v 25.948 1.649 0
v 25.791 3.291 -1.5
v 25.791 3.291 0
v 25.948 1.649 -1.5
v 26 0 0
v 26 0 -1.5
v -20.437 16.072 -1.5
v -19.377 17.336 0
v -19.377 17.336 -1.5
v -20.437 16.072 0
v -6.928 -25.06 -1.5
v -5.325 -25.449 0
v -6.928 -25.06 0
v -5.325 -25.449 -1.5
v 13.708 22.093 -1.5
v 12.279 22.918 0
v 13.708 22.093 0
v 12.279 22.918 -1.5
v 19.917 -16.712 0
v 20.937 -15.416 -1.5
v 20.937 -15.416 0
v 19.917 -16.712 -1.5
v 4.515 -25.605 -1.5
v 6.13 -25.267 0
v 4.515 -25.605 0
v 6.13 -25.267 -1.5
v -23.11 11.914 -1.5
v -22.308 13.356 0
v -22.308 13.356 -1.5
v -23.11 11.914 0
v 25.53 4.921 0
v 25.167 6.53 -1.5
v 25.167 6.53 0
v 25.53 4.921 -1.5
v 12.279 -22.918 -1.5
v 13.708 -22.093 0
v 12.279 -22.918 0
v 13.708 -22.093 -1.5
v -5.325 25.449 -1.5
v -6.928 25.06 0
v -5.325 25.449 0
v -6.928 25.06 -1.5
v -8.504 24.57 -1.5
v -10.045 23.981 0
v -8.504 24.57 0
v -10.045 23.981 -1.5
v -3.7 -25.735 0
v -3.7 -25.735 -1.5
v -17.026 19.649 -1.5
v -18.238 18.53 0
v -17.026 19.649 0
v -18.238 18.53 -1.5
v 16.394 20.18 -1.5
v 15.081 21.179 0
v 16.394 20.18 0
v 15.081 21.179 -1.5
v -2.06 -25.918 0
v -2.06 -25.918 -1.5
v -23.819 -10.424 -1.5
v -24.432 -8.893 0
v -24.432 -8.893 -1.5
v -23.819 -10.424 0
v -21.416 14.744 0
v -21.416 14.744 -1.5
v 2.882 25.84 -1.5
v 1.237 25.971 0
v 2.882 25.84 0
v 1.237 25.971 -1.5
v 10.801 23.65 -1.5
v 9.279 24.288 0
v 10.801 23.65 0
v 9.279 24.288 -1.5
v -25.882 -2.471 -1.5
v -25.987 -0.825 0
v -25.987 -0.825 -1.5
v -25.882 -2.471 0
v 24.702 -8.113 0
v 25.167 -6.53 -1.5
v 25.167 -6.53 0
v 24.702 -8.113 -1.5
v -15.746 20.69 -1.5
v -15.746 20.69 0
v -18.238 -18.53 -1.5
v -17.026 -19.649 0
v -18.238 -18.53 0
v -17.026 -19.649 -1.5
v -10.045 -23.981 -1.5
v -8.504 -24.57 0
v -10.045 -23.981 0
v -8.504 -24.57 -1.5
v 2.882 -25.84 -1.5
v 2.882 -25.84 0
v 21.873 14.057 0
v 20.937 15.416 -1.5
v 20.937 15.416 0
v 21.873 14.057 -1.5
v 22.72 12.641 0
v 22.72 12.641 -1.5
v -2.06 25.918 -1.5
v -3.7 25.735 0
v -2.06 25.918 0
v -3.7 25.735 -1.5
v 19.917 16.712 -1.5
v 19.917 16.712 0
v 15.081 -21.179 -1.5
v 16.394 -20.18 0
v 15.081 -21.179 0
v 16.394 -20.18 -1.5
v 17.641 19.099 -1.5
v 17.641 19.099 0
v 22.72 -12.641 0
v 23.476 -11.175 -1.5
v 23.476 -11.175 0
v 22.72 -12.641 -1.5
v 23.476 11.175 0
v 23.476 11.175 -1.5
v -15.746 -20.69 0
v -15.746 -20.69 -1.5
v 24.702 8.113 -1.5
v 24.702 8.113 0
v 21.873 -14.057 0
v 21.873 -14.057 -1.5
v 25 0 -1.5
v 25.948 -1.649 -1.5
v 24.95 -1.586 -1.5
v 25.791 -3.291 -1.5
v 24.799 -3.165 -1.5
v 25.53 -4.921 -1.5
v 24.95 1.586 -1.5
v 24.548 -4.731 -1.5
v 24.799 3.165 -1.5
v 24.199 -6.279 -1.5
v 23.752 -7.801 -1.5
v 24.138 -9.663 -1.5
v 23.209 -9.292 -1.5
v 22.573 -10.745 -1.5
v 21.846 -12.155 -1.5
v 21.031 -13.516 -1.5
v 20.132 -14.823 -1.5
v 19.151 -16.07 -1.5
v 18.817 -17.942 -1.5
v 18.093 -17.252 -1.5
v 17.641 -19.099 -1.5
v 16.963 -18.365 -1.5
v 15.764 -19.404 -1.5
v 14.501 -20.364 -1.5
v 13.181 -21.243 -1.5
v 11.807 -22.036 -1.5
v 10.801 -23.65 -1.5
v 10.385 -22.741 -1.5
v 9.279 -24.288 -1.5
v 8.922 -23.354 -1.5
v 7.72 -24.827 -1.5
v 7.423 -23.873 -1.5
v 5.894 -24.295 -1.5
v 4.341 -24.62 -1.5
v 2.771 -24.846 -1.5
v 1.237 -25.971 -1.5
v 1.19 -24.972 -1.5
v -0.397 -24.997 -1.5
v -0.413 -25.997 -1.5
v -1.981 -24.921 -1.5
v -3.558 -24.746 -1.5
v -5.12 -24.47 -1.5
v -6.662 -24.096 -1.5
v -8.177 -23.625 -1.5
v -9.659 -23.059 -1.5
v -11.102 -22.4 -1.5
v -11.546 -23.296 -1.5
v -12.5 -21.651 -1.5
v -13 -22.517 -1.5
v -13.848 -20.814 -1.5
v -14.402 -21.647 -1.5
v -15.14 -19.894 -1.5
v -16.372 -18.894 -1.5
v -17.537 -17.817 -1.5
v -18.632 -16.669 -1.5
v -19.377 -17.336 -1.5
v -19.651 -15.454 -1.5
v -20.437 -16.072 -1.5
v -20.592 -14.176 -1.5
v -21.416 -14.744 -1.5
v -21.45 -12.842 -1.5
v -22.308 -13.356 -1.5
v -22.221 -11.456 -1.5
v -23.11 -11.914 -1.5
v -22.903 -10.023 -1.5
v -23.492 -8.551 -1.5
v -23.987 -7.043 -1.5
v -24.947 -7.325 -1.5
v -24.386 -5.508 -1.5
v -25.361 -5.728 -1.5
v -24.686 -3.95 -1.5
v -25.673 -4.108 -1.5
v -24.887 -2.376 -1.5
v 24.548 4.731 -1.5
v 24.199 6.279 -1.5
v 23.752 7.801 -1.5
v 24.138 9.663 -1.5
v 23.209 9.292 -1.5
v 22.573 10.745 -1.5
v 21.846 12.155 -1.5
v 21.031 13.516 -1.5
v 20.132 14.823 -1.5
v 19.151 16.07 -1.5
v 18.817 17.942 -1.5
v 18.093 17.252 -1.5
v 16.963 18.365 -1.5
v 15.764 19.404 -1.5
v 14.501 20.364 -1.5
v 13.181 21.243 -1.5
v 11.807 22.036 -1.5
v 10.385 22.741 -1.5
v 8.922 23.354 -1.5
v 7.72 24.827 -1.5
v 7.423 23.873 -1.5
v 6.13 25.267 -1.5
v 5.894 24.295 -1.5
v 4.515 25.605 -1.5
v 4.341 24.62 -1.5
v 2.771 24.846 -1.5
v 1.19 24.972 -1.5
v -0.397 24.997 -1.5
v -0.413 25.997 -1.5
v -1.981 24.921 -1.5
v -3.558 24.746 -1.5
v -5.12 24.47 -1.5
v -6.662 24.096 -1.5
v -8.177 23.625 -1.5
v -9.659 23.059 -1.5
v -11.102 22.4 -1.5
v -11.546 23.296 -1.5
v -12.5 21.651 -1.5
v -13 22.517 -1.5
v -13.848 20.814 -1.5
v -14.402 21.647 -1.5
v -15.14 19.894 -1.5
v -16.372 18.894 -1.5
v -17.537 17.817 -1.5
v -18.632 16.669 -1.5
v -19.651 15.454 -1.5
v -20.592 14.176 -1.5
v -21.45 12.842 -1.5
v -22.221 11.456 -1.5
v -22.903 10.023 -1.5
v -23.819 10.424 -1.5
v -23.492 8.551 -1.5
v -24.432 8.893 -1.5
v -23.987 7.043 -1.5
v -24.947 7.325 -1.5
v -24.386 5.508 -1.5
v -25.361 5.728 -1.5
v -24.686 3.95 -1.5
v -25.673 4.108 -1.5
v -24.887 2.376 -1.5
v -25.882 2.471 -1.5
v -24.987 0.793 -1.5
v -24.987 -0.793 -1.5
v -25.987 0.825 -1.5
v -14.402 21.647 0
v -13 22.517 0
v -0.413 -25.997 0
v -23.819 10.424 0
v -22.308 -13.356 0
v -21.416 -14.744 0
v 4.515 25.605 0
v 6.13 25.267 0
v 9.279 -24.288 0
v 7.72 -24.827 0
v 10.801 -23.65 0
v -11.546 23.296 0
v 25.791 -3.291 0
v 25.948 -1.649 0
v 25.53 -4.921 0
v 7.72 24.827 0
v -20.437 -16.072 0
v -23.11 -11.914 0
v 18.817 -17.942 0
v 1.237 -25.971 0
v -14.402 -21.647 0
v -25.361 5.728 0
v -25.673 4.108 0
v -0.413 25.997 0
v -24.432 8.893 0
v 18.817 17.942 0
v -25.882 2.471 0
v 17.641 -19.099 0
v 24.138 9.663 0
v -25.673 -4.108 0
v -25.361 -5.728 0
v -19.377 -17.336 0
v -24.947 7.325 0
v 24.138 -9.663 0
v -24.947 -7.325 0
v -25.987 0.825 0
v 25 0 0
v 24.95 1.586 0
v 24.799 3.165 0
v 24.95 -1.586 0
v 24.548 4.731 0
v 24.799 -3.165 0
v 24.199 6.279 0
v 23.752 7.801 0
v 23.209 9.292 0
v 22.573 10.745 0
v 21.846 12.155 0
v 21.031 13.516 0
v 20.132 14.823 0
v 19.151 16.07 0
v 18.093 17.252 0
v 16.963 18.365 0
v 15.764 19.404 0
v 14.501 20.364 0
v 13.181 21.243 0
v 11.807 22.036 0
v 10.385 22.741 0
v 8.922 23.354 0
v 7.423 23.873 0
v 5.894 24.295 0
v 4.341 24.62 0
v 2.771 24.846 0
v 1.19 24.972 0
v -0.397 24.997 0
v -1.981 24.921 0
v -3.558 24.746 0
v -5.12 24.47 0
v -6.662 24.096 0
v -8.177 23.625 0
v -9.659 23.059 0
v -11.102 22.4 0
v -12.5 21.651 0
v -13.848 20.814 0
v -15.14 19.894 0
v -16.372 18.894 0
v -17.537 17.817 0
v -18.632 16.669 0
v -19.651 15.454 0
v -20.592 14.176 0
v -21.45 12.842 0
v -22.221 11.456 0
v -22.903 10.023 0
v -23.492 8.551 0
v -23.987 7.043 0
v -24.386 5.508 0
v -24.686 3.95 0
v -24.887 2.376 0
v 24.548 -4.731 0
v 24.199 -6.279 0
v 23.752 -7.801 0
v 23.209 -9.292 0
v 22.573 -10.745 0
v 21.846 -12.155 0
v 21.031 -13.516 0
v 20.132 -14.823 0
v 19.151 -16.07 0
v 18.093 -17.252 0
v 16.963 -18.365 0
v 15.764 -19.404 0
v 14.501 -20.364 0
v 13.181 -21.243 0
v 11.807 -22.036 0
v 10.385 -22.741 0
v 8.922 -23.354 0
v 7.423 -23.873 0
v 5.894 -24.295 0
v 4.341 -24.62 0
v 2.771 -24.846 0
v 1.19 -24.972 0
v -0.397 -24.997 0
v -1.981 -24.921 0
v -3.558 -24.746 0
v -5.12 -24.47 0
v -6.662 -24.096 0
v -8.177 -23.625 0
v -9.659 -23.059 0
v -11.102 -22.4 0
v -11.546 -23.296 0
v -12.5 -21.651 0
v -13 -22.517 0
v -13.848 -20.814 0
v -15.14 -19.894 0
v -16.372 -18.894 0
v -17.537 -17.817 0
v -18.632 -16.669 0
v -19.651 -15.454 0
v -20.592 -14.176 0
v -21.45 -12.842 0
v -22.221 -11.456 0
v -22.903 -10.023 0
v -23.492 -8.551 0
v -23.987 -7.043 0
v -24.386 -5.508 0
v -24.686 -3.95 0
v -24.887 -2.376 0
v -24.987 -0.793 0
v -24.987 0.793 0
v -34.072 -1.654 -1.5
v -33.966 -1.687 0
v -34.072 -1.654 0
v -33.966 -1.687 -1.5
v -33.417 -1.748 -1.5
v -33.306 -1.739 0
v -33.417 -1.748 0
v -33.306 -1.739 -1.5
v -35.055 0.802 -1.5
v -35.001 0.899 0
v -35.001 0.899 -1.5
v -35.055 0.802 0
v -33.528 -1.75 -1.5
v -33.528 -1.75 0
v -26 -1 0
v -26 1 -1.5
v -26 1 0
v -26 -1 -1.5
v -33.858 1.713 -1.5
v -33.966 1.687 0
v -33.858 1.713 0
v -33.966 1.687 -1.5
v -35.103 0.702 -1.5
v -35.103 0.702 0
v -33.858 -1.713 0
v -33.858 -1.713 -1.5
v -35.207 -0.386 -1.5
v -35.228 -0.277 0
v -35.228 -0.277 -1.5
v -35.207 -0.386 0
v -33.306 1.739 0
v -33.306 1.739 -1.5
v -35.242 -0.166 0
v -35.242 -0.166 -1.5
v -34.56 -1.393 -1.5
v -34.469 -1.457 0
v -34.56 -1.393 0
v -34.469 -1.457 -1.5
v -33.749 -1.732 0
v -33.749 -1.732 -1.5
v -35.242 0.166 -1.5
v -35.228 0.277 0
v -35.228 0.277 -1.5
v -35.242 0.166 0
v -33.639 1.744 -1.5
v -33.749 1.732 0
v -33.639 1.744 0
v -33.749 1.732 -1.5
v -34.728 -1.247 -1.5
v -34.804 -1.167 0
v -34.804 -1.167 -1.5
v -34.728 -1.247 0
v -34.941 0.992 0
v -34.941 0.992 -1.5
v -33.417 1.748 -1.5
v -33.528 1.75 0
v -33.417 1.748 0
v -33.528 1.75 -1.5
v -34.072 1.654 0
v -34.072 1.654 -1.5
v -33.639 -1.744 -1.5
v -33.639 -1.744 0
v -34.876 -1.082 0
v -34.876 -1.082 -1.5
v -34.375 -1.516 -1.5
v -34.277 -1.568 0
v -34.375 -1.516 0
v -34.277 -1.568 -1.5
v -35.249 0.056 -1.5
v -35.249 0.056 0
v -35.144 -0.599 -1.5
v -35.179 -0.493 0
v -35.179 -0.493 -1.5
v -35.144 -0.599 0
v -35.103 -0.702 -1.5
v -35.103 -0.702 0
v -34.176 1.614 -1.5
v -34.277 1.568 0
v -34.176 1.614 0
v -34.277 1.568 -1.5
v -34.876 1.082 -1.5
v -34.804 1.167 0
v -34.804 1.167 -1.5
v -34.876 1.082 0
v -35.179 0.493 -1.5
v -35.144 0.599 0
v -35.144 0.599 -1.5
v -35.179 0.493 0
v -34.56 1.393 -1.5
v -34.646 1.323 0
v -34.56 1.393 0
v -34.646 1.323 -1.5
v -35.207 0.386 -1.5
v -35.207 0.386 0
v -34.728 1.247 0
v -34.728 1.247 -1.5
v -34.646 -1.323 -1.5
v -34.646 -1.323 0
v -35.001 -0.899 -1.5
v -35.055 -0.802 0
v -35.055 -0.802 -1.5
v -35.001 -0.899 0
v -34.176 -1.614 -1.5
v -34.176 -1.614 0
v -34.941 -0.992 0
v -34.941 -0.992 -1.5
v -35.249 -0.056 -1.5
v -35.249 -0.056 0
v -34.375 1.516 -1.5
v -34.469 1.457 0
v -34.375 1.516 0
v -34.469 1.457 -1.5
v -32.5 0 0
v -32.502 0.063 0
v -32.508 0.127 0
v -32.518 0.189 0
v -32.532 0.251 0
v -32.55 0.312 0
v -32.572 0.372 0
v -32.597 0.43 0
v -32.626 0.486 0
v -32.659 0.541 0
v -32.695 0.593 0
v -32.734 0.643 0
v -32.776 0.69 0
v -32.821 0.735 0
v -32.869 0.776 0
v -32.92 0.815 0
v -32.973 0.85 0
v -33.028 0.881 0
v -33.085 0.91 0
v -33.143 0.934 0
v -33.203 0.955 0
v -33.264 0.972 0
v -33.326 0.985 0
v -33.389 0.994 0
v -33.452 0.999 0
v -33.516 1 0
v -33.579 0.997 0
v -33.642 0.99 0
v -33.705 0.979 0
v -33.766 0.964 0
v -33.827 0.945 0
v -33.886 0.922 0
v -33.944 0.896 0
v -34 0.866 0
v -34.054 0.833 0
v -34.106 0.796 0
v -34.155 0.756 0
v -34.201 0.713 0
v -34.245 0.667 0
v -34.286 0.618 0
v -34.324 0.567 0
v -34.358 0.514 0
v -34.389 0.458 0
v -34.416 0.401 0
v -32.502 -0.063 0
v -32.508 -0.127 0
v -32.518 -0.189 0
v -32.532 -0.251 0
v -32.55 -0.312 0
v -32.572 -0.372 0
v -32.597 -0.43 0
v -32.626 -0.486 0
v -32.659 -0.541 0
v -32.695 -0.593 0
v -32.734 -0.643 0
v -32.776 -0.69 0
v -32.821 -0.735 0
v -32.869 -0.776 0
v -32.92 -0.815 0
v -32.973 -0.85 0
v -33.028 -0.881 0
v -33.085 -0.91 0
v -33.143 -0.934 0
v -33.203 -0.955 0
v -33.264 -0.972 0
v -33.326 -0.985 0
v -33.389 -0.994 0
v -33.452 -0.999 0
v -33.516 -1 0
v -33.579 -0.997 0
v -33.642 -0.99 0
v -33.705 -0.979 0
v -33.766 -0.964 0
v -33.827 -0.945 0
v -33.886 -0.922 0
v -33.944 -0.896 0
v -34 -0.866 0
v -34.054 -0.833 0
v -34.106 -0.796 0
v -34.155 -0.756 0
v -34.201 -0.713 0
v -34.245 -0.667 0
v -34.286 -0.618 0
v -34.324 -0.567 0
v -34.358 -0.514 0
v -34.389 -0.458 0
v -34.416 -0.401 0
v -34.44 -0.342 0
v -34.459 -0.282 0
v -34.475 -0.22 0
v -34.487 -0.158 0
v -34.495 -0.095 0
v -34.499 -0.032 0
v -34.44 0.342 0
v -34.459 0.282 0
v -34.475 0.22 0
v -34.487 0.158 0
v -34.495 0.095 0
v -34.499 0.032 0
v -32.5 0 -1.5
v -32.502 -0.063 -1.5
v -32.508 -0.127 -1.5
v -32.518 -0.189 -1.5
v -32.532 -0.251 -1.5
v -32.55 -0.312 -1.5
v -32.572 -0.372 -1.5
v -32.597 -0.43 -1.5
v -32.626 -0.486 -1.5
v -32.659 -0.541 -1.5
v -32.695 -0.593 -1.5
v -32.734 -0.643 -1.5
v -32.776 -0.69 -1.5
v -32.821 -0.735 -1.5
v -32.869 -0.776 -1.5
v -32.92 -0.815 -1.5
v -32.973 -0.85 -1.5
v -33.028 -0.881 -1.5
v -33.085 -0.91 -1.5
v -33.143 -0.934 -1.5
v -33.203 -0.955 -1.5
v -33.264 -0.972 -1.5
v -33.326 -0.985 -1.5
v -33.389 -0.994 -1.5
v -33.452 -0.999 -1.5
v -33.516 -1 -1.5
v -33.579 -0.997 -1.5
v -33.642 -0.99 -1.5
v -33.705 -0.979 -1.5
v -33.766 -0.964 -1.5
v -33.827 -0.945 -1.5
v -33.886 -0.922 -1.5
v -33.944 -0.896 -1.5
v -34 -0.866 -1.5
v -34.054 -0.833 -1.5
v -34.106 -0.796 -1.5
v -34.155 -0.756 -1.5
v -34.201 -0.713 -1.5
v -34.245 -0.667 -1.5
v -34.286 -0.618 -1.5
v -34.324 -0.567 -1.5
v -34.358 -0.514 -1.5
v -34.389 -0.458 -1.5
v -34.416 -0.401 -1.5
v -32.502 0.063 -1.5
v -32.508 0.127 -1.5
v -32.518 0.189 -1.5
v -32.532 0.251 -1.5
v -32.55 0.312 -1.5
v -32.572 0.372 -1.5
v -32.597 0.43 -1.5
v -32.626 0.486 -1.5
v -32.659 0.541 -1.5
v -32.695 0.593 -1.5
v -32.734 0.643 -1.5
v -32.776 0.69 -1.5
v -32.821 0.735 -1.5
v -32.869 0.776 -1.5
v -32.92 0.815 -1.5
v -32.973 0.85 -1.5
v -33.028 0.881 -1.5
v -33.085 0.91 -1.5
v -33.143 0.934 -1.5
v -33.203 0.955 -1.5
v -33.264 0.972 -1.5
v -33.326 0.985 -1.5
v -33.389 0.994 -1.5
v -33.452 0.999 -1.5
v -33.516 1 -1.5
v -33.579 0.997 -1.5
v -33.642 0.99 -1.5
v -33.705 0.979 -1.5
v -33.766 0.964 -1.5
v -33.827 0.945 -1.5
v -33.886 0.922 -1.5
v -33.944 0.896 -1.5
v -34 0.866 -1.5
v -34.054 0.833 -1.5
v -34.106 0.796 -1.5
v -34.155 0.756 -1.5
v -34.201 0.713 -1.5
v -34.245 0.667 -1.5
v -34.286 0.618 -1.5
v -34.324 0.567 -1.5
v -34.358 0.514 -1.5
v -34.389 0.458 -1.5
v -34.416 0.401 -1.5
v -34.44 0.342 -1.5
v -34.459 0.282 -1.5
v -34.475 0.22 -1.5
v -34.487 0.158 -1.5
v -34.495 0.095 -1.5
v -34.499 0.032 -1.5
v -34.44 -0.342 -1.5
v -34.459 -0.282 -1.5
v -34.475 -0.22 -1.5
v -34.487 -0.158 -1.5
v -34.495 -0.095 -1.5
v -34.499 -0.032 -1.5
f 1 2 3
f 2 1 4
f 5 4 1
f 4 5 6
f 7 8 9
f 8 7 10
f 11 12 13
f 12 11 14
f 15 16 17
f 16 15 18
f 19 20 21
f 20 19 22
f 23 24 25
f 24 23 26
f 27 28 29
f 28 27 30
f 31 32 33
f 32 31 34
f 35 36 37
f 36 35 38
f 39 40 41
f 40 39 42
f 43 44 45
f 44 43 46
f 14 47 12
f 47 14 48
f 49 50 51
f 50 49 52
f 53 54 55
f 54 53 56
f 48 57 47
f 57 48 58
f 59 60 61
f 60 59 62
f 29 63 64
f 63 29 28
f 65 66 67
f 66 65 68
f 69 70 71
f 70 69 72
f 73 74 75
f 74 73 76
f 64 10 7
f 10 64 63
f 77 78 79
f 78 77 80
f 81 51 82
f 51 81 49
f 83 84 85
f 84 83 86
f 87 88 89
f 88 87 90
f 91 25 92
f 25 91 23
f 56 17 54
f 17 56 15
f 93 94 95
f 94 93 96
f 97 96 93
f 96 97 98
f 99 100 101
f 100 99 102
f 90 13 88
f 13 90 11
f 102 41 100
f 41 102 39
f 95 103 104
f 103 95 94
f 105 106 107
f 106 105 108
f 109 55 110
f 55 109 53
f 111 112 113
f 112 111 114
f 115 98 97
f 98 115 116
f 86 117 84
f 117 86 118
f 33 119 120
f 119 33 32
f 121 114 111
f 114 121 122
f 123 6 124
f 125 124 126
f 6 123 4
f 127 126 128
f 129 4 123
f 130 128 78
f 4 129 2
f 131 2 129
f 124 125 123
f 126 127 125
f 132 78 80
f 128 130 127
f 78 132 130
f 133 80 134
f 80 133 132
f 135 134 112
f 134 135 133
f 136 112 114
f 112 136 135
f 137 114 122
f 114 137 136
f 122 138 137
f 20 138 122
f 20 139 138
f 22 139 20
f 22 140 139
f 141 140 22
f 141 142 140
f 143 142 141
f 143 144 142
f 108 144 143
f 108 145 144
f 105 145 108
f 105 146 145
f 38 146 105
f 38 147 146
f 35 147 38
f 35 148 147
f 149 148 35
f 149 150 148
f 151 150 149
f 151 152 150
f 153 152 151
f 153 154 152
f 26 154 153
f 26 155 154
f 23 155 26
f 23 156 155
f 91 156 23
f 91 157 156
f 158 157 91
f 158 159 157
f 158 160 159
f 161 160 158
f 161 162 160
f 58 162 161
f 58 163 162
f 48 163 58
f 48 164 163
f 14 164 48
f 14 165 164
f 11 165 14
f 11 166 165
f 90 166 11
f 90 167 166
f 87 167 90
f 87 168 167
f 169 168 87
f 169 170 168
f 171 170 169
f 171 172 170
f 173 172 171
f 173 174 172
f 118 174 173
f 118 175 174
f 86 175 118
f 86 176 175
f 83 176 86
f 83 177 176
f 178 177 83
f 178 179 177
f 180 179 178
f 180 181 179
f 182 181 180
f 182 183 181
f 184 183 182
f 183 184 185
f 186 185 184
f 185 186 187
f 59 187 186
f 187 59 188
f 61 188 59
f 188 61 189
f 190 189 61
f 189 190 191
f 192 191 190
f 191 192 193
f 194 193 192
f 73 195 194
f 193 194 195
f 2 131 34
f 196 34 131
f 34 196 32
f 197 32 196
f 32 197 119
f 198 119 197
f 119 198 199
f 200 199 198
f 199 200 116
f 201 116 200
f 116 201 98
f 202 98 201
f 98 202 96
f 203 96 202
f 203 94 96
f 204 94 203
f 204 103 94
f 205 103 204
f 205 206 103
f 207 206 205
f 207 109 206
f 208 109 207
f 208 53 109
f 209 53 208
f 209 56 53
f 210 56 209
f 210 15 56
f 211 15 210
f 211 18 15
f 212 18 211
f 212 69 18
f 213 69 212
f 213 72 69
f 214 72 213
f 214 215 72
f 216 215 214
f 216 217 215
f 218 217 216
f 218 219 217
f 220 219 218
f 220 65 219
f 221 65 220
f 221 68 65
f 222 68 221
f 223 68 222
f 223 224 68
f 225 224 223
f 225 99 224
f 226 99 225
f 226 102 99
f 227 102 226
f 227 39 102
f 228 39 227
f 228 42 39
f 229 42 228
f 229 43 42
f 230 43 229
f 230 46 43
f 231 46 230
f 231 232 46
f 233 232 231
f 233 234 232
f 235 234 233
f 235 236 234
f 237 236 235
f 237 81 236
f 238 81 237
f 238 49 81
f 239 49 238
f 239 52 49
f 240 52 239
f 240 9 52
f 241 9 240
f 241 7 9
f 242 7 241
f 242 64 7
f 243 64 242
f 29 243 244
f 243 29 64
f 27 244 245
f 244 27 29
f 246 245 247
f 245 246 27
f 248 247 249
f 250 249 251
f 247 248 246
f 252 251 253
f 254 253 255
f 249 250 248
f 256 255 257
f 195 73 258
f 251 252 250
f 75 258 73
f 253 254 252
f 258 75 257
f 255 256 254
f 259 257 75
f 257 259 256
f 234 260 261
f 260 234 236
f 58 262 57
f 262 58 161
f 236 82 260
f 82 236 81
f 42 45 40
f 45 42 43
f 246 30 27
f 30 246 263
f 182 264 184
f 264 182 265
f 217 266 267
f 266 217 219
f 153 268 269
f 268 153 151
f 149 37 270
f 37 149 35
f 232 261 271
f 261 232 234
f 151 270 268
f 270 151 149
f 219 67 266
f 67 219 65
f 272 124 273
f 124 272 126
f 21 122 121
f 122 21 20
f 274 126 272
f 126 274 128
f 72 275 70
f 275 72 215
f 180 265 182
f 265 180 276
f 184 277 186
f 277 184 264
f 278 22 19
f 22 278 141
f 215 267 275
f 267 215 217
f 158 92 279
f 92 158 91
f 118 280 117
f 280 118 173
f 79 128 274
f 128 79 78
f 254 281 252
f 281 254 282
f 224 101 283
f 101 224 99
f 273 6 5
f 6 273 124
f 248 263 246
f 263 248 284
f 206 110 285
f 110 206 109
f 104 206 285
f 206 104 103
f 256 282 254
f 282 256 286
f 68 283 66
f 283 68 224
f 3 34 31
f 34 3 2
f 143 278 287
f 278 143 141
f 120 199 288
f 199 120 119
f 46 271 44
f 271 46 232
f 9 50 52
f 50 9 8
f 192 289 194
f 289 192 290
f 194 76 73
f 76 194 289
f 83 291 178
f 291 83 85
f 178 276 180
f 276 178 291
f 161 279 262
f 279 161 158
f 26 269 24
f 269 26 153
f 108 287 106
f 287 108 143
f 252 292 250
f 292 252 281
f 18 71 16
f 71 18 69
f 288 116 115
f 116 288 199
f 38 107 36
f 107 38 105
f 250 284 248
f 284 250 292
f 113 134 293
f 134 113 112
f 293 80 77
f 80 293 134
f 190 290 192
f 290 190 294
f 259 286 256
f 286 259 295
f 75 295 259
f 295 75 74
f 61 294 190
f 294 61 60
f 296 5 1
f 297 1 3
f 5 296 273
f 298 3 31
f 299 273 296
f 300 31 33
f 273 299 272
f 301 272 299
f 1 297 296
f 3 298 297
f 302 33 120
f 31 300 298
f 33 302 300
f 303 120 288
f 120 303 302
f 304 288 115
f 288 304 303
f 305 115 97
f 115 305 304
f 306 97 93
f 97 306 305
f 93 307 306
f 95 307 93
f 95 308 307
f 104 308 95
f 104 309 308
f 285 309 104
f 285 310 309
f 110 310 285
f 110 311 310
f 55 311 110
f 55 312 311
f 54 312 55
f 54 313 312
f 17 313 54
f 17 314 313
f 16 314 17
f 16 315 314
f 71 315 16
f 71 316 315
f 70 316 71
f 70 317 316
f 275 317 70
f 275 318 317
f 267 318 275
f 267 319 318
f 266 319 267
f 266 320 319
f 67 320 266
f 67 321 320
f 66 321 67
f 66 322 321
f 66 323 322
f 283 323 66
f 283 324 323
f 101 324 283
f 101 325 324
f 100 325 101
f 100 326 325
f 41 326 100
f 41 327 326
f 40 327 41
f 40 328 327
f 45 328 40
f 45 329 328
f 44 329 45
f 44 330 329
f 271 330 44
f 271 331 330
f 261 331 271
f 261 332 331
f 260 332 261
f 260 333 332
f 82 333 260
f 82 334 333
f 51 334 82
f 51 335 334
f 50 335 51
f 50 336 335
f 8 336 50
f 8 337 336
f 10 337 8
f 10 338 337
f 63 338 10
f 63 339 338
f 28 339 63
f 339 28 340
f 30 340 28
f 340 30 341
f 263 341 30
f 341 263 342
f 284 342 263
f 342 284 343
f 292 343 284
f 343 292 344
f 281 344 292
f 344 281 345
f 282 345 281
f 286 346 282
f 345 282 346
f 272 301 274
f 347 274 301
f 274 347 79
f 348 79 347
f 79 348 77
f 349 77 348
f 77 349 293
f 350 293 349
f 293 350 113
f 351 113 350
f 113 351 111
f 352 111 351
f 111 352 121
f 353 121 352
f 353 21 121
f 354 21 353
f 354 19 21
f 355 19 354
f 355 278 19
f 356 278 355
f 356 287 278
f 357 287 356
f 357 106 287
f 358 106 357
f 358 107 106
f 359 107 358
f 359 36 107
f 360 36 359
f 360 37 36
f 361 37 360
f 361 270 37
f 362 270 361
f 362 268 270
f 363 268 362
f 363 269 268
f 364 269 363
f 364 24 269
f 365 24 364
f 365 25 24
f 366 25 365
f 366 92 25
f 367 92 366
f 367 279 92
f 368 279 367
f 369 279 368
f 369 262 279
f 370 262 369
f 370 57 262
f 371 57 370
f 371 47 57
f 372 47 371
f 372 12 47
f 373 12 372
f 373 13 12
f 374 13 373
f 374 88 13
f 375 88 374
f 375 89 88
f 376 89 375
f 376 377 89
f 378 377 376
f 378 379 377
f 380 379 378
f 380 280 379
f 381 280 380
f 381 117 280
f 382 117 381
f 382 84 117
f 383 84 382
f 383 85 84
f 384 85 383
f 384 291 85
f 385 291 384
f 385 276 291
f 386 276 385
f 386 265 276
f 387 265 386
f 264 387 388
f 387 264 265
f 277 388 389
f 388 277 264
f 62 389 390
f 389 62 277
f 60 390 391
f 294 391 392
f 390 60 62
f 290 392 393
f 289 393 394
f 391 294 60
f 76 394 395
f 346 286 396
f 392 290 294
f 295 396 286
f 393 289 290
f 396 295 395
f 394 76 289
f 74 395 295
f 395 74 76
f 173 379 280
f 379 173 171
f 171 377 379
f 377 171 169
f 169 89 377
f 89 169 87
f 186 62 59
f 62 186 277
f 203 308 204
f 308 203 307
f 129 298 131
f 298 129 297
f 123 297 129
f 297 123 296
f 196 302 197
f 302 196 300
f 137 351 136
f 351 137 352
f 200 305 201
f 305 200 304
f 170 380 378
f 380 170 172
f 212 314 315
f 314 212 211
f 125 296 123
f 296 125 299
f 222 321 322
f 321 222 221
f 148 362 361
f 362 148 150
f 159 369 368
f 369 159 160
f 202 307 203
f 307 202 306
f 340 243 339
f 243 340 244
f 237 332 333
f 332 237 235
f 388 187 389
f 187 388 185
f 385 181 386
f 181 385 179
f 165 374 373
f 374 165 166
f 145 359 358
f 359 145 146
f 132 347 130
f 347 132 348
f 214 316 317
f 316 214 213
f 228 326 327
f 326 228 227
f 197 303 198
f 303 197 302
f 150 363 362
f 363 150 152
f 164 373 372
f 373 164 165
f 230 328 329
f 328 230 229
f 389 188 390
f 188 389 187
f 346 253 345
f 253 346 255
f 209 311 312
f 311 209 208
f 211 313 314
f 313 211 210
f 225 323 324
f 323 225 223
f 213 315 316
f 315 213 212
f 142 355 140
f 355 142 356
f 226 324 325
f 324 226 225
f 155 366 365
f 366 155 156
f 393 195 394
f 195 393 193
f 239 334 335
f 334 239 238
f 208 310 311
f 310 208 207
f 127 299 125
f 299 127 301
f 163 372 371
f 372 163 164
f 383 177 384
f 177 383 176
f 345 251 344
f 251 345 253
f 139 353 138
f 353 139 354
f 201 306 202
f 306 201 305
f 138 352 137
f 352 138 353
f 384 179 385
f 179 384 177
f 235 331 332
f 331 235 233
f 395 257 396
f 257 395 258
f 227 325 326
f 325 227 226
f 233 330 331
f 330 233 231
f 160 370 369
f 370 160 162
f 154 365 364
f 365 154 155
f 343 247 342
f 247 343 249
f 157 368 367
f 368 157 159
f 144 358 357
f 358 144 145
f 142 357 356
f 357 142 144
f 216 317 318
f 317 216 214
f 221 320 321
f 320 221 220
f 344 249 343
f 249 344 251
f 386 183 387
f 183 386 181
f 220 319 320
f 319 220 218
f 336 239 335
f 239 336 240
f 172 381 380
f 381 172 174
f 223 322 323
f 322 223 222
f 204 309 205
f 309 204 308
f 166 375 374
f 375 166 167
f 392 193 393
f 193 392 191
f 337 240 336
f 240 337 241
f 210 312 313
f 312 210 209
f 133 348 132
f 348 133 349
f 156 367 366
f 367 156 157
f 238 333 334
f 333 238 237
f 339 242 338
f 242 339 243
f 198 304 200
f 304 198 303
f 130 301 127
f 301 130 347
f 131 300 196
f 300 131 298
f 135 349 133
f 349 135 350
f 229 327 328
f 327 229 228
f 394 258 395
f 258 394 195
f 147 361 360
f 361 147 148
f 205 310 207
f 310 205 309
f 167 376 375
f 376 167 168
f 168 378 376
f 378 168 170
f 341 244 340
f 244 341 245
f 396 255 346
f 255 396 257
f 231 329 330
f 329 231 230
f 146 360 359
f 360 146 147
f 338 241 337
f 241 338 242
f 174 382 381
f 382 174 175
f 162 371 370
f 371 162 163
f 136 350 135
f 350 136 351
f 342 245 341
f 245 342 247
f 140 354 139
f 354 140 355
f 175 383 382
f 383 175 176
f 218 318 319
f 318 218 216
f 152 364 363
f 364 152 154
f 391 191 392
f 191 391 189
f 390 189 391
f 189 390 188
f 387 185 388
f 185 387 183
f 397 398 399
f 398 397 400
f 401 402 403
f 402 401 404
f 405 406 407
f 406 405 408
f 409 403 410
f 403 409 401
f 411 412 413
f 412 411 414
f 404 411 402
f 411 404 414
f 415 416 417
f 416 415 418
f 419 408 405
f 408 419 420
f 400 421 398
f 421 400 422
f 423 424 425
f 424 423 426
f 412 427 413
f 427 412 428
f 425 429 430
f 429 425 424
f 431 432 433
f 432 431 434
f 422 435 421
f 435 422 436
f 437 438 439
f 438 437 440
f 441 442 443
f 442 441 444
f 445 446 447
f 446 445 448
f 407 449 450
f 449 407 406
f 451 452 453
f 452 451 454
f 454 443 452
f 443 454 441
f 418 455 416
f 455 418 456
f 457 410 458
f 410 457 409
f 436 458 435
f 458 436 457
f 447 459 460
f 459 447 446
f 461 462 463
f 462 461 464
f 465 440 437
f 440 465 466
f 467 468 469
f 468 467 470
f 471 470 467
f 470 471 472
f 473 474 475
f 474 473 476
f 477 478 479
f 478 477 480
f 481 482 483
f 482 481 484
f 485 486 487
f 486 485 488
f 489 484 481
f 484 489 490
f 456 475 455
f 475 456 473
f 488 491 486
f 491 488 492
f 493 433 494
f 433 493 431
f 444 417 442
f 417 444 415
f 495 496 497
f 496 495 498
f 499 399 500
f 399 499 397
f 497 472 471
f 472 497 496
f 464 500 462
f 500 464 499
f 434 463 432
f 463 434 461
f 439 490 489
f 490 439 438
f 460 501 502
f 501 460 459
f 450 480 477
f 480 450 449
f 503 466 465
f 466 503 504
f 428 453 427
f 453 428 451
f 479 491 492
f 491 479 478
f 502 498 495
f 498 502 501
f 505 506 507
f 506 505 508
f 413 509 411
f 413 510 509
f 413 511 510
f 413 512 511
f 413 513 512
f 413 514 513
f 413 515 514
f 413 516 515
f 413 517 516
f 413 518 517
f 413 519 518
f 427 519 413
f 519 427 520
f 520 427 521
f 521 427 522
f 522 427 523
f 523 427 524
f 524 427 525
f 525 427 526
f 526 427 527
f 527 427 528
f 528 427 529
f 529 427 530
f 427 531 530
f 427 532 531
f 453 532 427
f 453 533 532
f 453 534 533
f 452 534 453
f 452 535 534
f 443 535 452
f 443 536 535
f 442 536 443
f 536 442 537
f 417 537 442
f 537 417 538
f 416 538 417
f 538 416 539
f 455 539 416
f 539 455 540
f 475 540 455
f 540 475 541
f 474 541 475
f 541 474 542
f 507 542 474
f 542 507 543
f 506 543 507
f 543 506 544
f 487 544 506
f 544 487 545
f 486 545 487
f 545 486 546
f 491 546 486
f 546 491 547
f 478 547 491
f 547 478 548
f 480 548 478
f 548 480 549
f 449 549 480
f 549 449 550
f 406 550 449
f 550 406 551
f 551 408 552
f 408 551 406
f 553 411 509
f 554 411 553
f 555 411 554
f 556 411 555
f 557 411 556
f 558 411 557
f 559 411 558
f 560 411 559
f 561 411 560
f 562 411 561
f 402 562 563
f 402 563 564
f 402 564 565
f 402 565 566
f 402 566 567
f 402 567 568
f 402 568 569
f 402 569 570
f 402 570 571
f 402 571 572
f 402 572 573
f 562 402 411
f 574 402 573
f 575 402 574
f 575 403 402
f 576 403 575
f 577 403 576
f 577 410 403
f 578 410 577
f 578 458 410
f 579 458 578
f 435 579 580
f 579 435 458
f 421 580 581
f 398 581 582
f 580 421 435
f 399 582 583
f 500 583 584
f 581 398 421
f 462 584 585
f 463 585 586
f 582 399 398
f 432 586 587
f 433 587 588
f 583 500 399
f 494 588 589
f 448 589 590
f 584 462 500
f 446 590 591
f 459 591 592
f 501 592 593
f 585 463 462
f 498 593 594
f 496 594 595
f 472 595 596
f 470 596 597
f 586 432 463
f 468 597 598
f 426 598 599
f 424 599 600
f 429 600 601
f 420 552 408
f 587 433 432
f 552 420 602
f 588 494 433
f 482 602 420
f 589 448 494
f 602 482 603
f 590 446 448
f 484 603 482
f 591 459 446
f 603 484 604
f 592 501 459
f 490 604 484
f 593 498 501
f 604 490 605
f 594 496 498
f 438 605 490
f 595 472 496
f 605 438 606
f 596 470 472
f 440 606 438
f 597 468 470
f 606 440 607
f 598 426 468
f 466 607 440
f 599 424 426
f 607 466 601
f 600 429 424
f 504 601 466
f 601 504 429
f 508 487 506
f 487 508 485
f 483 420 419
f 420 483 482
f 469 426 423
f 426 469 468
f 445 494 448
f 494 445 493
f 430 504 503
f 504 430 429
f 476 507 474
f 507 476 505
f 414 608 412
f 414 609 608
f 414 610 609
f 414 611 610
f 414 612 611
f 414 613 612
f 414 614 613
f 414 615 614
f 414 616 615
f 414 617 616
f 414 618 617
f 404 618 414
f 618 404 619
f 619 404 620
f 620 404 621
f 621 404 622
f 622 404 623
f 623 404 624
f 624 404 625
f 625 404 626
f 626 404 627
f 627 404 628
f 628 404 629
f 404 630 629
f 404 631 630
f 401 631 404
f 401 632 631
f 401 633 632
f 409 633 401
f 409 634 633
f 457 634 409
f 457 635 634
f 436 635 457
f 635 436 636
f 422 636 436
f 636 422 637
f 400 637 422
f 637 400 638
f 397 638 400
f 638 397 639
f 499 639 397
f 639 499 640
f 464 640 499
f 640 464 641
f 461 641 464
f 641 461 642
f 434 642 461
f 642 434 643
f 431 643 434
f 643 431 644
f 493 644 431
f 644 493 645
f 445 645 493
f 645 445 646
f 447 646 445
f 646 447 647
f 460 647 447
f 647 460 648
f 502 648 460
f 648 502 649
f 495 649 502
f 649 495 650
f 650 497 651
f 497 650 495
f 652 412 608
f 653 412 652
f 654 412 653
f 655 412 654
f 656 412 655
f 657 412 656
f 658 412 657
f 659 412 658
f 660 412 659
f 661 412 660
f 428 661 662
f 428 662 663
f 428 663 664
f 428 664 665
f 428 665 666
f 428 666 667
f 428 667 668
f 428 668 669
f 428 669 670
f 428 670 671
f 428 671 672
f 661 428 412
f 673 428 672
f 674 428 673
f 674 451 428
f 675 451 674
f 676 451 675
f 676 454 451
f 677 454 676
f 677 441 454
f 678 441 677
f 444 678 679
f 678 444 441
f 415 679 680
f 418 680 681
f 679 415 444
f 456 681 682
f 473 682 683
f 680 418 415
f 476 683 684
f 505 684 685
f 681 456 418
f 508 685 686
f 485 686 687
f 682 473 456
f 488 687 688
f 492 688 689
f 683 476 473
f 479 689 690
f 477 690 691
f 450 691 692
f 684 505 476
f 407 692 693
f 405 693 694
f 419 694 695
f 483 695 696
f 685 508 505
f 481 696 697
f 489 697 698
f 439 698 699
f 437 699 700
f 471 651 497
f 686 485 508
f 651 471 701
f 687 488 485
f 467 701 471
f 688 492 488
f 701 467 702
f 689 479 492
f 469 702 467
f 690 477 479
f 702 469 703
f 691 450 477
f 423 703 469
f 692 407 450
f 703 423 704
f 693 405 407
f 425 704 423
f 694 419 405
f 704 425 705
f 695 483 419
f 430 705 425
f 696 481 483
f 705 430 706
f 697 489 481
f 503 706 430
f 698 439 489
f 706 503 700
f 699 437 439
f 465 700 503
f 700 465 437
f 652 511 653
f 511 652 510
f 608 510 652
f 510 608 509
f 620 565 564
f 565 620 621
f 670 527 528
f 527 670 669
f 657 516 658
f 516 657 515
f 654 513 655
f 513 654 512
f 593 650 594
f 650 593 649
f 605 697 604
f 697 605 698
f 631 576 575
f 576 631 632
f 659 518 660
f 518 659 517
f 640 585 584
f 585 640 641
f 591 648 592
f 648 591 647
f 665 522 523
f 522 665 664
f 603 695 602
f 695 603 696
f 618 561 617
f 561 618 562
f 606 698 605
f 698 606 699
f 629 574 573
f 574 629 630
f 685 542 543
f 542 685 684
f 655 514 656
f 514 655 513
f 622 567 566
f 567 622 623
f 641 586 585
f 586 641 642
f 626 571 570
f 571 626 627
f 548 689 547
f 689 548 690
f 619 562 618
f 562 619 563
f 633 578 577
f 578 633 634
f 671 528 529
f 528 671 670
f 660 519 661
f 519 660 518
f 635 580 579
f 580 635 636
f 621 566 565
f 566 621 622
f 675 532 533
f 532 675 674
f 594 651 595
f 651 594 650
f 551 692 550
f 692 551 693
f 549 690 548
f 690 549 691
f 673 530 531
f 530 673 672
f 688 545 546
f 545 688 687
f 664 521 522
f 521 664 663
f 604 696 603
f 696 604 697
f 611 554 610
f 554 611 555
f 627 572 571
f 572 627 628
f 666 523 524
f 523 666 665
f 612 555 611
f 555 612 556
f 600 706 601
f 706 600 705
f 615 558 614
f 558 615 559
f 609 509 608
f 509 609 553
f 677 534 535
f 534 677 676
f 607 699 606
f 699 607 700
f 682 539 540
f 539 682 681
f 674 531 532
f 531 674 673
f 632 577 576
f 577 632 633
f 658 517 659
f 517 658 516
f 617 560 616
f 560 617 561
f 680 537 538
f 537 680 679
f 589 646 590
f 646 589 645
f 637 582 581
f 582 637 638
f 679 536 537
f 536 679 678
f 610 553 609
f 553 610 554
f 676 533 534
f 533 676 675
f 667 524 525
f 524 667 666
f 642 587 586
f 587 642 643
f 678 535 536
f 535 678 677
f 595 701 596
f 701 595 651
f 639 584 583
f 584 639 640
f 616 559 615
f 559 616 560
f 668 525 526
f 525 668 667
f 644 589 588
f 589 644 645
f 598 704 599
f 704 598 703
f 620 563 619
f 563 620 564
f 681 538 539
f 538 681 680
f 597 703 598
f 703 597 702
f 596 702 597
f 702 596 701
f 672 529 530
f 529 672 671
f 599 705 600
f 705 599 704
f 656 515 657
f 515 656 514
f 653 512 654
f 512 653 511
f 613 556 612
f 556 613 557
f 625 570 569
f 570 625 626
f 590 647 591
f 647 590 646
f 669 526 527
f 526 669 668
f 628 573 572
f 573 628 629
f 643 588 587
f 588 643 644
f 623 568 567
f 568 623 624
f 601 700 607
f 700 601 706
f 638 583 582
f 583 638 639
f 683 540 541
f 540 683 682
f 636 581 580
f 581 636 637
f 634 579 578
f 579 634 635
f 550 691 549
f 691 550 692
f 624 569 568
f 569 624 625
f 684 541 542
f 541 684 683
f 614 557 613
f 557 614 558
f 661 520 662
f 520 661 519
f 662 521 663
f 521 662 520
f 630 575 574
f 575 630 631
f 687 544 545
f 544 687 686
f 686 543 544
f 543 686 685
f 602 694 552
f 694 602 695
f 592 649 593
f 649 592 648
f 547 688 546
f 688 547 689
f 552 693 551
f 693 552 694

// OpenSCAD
// file: ../Parts/rounder.scad
// rounder.scad
// cutting tool for rounding off corners with a cylinder

//---------------------
module rounder(
r=10,   // radius
h=10,   // height
f=22,    // $fn
extra=0.01  // extra size for the cube
){

difference(){
  translate([-extra,-extra,-extra])
  cube([r+extra,r+extra,h+2*extra]);
  translate([r,r,-1])
  cylinder(r=r,h=h+2,$fn=f);
}

}

//---------------------------------------------------------------------------
module bevel(x=1,y=1,h=10){

linear_extrude(height=h)
polygon(points=[[0,0],[x,0],[0,y]]);
    
}
  

//========================

rounder();

//========================
// main file
//======================================================================
// F4.scad
// 
// 5 pointed large fractal stars for earrings.
//
// DrTomFlint 23 Dec 2023
//======================================================================

// order of sierpinski fractal
order = 3; //[0,1,2,3,4,5,6,7]
// size of smallest pyramid
size = 2.5; //[2:50]

/* [Hidden] */
eps = 0.25;         // translate for pyramids
//epsr = 0.1;
epsr = 0.05;

epsh = 2.5*eps;
sq2 = 1.41421356;       
epsl = 0.5;         // translate for cube cuts
epsy = 0.12;        // translate for cube cuts

use <../Parts/rounder.scad>
use <../Fractals/Lsystem.scad>

// F4a:
//~ sides=5;
//~ peak=1.4;
//~ hi=0.9;
//~ rescale = 1.0;

// F4bc:
//~ sides=5;
//~ peak=1.4;
//~ hi=1.5;
//~ rescale = 1.0;

// F4d:
//~ sides=6;
//~ peak=1.73;
//~ hi=0.9;
//~ rescale=0.8;

// F4e:
//~ sides=7;
//~ peak=2.075;
//~ hi=0.9;
//~ rescale=0.67;

//--------------------
// F4f:
//~ sides=5;
//~ peak=1.4;
//~ hi=1.5;
//~ rescale = 1.0;

// F4g:
//~ sides=6;
//~ peak=1.73;
//~ hi=1.5;
//~ rescale = 0.8;

// F4h:
//~ sides=7;
//~ peak=2.075;
//~ hi=1.5;
//~ rescale = 0.67;

//----------------------
// F4i:
//~ sides=5;
//~ peak=1.4;
//~ hi=1.5;
//~ rescale = 1.0;
//~ ring=1;
//~ r1 = 20.5;
//~ r2 = 25.0;

// F4j:
//~ sides=6;
//~ peak=1.73;
//~ hi=1.5;
//~ rescale = 1.0;
//~ ring=1;
//~ r1 = 25.5;
//~ r2 = 31.0;

// F4k:
//~ sides=7;
//~ peak=2.075;
//~ hi=1.5;
//~ rescale = 1.0;
//~ ring=1;
//~ r1 = 30.5;
//~ r2 = 37.0;

//----------------------
// F4m:
//~ sides=5;
//~ hi=1.5;
//~ rescale = 1.0;
//~ ring=1;
//~ r1 = 26.0;
//~ r2 = 33.5;
//~ peak1=2.4;
//~ peak2=1.4;
//~ dxa=8.8;
//~ hi2=3;

// F4n:
//~ sides=6;
//~ peak1=1.73;
//~ peak2=1.73;
//~ hi=1.5;
//~ rescale = 1.0;
//~ ring=1;
//~ r1 = 25.5;
//~ r2 = 31.0;
//~ hi2=3;

// F4o:
//~ sides=7;
//~ peak1=1.8;
//~ peak2=2.075;
//~ dxa=-2.42;
//~ hi=1.5;
//~ rescale = 1.0;
//~ ring=0;
//~ r1 = 28;
//~ r2 = 34.5;
//~ hi2=3;

// F4p:
//~ sides=7;
//~ peak1=1.8;
//~ peak2=2.075;
//~ dxa=-2.42;
//~ hi=1.5;
//~ rescale = 1.0;
//~ ring=0;
//~ r1 = 28;
//~ r2 = 34.5;
//~ hi2=1.5;

// F4q:
sides=5;
hi=1.5;
rescale = 1.0;
ring=0;
r1 = 26.0;
r2 = 33.5;
peak1=2.4;
peak2=1.4;
dxa=8.8;
hi2=1.5;


hanger=0;

//----------------------------------------------------------
// sierpinsky recursive code 
module ss(ord){
    k = pow(2,ord);
    w = size *k;
    
    if (k<1){  // end of recursive function
        rotate([0,0,45])cylinder(r1=size,r2 = epsr, h = 1.0*size, $fn=4);
    }
    else {
      difference() {
        union () { // set the five smaller sierpinski pyramids
            // they are shifted so that there is an intersection for spiral vase
            translate([-k*eps+w/sq2,-k*eps+w/sq2,0]) ss(ord-1);  
            translate([k*eps-w/sq2,k*eps-w/sq2,0]) ss(ord-1); 
            translate([k*eps-w/sq2,-k*eps+w/sq2,0]) ss(ord-1); 
            translate([-k*eps+w/sq2,k*eps-w/sq2,0]) ss(ord-1); 
            translate([0,0,-sq2*k*eps+1.01*w]) rotate([180,0,0]) ss(ord-1);
            translate([0,0,-sq2*k*eps+1.01*w]) rotate([0,0,0]) ss(ord-1);    
          
            // petit carré au centre
            //cube([0.3,0.3,2], center = true);
             } // end union
        
        // remove 4 small cubes to allow a sierpinski curve
        translate([epsl,-epsy/2,0])  cube([sq2*w,epsy,epsh]);
        rotate([0,0,90]) translate([epsl,-epsy/2,0])  cube([sq2*w,epsy,epsh]);
        rotate([0,0,180]) translate([epsl,-epsy/2,0])  cube([sq2*w,epsy,epsh]);
        rotate([0,0,270]) translate([epsl,-epsy/2,0])  cube([sq2*w,epsy,epsh]);
     
    } // end diff    
   } // end else
 } // end module ss


//-----------------------------------------------------------------
module sA(cut=0){

ang1=360/sides;
ang2=45;

  scale([peak1,1,1])    
  difference(){
      rotate([0,0,45])
      if(cut==0){
        difference(){
            ss(order-1);
            // remove bottom spikes
            translate([-120,-120,-3])
            cube([240,240,3]);
        }
      }else{
        rotate([0,0,45])
        cylinder(r1=size*3.33*order*cos(45),r2=0.01,h=size*3.33*order*cos(45),$fn=4);
      }
    
    // slice out a pie wedge
    rotate([0,0,ang2])
    translate([0,-100,-100])    
    cube([200,200,200]);
    rotate([0,0,-ang2])
    translate([0,-100,-100])    
    cube([200,200,200]);
  }

}


//-----------------------------------------------------------------
module sA1(cut=0){

ang1=360/sides;
ang2=45;

  translate([dxa,0,0])
  scale([peak1,1,1])    
  difference(){
      rotate([0,0,45])
      if(cut==0){
        difference(){
            ss(order-1);
            // remove bottom spikes
            translate([-120,-120,-3])
            cube([240,240,3]);
        }
      }else{
        rotate([0,0,45])
        cylinder(r1=size*3.33*order*cos(45),r2=0.01,h=size*3.33*order*cos(45),$fn=4);
      }
    
    // slice out a pie wedge
    rotate([0,0,ang2])
    translate([0,-100,-100])    
    cube([200,200,200]);
    rotate([0,0,-ang2])
    translate([0,-100,-100])    
    cube([200,200,200]);
    // cut into core and tip
    translate([-8.8,-100,-100])    
    cube([200,200,200]);
  }

}

//-----------------------------------------------------------------
module sA2(cut=0){

ang1=360/sides;
ang2=45;

  scale([peak2,1,1])    
  difference(){
      rotate([0,0,45])
      if(cut==0){
        difference(){
            ss(order-1);
            // remove bottom spikes
            translate([-120,-120,-3])
            cube([240,240,3]);
        }
      }else{
        rotate([0,0,45])
        cylinder(r1=size*3.33*order*cos(45),r2=0.01,h=size*3.33*order*cos(45),$fn=4);
      }
    
    // slice out a pie wedge
    rotate([0,0,ang2])
    translate([0,-100,-100])    
    cube([200,200,200]);
    rotate([0,0,-ang2])
    translate([0,-100,-100])    
    cube([200,200,200]);


    // cut into core and tip
    translate([-8.8-200,-100,-100])    
    cube([200,200,200]);
  }

}


//-----------------------------------------------------------------
module sC(){


if(peak1==peak2){
  // center hexagon and triangular points have same scale
  intersection(){
    translate([0,0,-50+hi])
    cube([200,200,100],center=true);
    
    translate([0.01,0,0])
    sA(cut=0);  
  }
}else{
  // center hexagon and triangular points have different scale
  intersection(){
    translate([0,0,-50+hi])
    cube([200,200,100],center=true);
    
    translate([0.01,0,0])
    sA1(cut=0);
  }
  intersection(){
    translate([0,0,-50+hi])
    cube([200,200,100],center=true);
    
    translate([0.01,0,0])
    sA2(cut=0);
  }
}

}

//-----------------------------------------------------------------
module sC2(){


if(peak1==peak2){
  // center hexagon and triangular points have same scale
  intersection(){
    translate([0,0,-50+hi2])
    cube([200,200,100],center=true);
    
    translate([0.01,0,0])
    sA(cut=0);  
  }
}else{
  // center hexagon and triangular points have different scale
  intersection(){
    translate([0,0,-50+hi2])
    cube([200,200,100],center=true);
    
    translate([0.01,0,0])
    sA1(cut=0);
  }
  intersection(){
    translate([0,0,-50+hi2])
    cube([200,200,100],center=true);
    
    translate([0.01,0,0])
    sA2(cut=0);
  }
}

}

//-----------------------------------------------------------------
module sD(){

ang1=360/sides;

  for (i=[0:sides-1]){
    rotate([0,0,i*ang1])
    translate([0,0,0])         // used +1 for purple tests?
    sC();
  }
}
//-----------------------------------------------------------------
module sD2(){

ang1=360/sides;

  for (i=[0:sides-1]){
    rotate([0,0,i*ang1])
    translate([0,0,0])         // used +1 for purple tests?
    sC2();
  }
}

//--------------------------------------------------------------------
module sE(cut=0){

x1=22;

scale([rescale,rescale,1])
if(cut==0){
  // full detail shape
  difference(){
    sD2();
  }
  difference(){
    translate([0,0,0.01])
    rotate([180,0,0])
    sD();
  }
}else{
  // simplified shape for cutting  
  difference(){
    union(){
      cylinder(r1=size*4.1*order,r2=0.01,h=size*2.5*order,$fn=3);
      rotate([0,0,60])
      cylinder(r1=size*4.1*order,r2=0.01,h=size*2.5*order,$fn=3);

      translate([0,0,-size*2.5*order])
      cylinder(r2=size*4.1*order,r1=0.01,h=size*2.5*order,$fn=3);
      translate([0,0,-size*2.5*order])
      rotate([0,0,60])
      cylinder(r2=size*4.1*order,r1=0.01,h=size*2.5*order,$fn=3);
    }
    
    translate([0,0,-50-3])
    cube([100,100,100],center=true);
    translate([0,0,50+3])
    cube([100,100,100],center=true);
  }
}  

if(ring==1){
  // outer ring
  translate([0,0,-0.75/2*hi])
  difference(){
    cylinder(r=r1,h=hi*1.25,center=true,$fn=99);
    cylinder(r=r1-1,h=hi*3,center=true,$fn=99);
  }
 
}  

if(hanger==1){
  // hanger loop
  translate([-r2,0,-0.75/2*hi])
  difference(){
    hull(){
      cylinder(r=1.75,h=hi*1.25,center=true,$fn=99);
      translate([4,0,0])
      cylinder(r=0.4,h=hi*1.25,center=true,$fn=99);
    }
    cylinder(r=1,h=hi*3,center=true,$fn=99);
  }
}


}

//---------------------------------------------------------------------
// make the ring and hanger its own part so it can be sliced as a solid
module ring(){
  
  // outer ring
  translate([0,0,-0.75/2*hi])
  difference(){
    cylinder(r=r1,h=hi*1.25,center=true,$fn=99);
    cylinder(r=r1-1,h=hi*3,center=true,$fn=99);
  }
 

  // hanger loop
  translate([-r2,0,-0.75/2*hi])
  difference(){
    hull(){
      cylinder(r=1.75,h=hi*1.25,center=true,$fn=99);
      translate([7,0,0])
      cube([1,2,hi*1.25],center=true);
      //cylinder(r=2,h=hi*1.25,center=true,$fn=99);
    }
    cylinder(r=1,h=hi*3,center=true,$fn=99);
  }

}
  
//---------------------------------------------------------------------
// make the ring and hanger its own part so it can be sliced as a solid
module thinring(){
  
  // outer ring
  translate([0,0,-1/2*hi])
  difference(){
    cylinder(r=r1,h=hi*1.0,center=true,$fn=99);
    cylinder(r=r1-1,h=hi*3,center=true,$fn=99);
  }
 

  // hanger loop
  translate([-r2,0,-1/2*hi])
  difference(){
    hull(){
      cylinder(r=1.75,h=hi*1.0,center=true,$fn=99);
      translate([7,0,0])
      cube([1,2,hi*1.0],center=true);
      //cylinder(r=2,h=hi*1.25,center=true,$fn=99);
    }
    cylinder(r=1,h=hi*3,center=true,$fn=99);
  }

}
  
//=====================================================================

// FIVE

//~ sA();
//~ sC();
//~ sD();
//~ sE();

//~ ring();
thinring();

// rescale A parts
//~ sA1();
//~ sA2();

//=====================================================================
